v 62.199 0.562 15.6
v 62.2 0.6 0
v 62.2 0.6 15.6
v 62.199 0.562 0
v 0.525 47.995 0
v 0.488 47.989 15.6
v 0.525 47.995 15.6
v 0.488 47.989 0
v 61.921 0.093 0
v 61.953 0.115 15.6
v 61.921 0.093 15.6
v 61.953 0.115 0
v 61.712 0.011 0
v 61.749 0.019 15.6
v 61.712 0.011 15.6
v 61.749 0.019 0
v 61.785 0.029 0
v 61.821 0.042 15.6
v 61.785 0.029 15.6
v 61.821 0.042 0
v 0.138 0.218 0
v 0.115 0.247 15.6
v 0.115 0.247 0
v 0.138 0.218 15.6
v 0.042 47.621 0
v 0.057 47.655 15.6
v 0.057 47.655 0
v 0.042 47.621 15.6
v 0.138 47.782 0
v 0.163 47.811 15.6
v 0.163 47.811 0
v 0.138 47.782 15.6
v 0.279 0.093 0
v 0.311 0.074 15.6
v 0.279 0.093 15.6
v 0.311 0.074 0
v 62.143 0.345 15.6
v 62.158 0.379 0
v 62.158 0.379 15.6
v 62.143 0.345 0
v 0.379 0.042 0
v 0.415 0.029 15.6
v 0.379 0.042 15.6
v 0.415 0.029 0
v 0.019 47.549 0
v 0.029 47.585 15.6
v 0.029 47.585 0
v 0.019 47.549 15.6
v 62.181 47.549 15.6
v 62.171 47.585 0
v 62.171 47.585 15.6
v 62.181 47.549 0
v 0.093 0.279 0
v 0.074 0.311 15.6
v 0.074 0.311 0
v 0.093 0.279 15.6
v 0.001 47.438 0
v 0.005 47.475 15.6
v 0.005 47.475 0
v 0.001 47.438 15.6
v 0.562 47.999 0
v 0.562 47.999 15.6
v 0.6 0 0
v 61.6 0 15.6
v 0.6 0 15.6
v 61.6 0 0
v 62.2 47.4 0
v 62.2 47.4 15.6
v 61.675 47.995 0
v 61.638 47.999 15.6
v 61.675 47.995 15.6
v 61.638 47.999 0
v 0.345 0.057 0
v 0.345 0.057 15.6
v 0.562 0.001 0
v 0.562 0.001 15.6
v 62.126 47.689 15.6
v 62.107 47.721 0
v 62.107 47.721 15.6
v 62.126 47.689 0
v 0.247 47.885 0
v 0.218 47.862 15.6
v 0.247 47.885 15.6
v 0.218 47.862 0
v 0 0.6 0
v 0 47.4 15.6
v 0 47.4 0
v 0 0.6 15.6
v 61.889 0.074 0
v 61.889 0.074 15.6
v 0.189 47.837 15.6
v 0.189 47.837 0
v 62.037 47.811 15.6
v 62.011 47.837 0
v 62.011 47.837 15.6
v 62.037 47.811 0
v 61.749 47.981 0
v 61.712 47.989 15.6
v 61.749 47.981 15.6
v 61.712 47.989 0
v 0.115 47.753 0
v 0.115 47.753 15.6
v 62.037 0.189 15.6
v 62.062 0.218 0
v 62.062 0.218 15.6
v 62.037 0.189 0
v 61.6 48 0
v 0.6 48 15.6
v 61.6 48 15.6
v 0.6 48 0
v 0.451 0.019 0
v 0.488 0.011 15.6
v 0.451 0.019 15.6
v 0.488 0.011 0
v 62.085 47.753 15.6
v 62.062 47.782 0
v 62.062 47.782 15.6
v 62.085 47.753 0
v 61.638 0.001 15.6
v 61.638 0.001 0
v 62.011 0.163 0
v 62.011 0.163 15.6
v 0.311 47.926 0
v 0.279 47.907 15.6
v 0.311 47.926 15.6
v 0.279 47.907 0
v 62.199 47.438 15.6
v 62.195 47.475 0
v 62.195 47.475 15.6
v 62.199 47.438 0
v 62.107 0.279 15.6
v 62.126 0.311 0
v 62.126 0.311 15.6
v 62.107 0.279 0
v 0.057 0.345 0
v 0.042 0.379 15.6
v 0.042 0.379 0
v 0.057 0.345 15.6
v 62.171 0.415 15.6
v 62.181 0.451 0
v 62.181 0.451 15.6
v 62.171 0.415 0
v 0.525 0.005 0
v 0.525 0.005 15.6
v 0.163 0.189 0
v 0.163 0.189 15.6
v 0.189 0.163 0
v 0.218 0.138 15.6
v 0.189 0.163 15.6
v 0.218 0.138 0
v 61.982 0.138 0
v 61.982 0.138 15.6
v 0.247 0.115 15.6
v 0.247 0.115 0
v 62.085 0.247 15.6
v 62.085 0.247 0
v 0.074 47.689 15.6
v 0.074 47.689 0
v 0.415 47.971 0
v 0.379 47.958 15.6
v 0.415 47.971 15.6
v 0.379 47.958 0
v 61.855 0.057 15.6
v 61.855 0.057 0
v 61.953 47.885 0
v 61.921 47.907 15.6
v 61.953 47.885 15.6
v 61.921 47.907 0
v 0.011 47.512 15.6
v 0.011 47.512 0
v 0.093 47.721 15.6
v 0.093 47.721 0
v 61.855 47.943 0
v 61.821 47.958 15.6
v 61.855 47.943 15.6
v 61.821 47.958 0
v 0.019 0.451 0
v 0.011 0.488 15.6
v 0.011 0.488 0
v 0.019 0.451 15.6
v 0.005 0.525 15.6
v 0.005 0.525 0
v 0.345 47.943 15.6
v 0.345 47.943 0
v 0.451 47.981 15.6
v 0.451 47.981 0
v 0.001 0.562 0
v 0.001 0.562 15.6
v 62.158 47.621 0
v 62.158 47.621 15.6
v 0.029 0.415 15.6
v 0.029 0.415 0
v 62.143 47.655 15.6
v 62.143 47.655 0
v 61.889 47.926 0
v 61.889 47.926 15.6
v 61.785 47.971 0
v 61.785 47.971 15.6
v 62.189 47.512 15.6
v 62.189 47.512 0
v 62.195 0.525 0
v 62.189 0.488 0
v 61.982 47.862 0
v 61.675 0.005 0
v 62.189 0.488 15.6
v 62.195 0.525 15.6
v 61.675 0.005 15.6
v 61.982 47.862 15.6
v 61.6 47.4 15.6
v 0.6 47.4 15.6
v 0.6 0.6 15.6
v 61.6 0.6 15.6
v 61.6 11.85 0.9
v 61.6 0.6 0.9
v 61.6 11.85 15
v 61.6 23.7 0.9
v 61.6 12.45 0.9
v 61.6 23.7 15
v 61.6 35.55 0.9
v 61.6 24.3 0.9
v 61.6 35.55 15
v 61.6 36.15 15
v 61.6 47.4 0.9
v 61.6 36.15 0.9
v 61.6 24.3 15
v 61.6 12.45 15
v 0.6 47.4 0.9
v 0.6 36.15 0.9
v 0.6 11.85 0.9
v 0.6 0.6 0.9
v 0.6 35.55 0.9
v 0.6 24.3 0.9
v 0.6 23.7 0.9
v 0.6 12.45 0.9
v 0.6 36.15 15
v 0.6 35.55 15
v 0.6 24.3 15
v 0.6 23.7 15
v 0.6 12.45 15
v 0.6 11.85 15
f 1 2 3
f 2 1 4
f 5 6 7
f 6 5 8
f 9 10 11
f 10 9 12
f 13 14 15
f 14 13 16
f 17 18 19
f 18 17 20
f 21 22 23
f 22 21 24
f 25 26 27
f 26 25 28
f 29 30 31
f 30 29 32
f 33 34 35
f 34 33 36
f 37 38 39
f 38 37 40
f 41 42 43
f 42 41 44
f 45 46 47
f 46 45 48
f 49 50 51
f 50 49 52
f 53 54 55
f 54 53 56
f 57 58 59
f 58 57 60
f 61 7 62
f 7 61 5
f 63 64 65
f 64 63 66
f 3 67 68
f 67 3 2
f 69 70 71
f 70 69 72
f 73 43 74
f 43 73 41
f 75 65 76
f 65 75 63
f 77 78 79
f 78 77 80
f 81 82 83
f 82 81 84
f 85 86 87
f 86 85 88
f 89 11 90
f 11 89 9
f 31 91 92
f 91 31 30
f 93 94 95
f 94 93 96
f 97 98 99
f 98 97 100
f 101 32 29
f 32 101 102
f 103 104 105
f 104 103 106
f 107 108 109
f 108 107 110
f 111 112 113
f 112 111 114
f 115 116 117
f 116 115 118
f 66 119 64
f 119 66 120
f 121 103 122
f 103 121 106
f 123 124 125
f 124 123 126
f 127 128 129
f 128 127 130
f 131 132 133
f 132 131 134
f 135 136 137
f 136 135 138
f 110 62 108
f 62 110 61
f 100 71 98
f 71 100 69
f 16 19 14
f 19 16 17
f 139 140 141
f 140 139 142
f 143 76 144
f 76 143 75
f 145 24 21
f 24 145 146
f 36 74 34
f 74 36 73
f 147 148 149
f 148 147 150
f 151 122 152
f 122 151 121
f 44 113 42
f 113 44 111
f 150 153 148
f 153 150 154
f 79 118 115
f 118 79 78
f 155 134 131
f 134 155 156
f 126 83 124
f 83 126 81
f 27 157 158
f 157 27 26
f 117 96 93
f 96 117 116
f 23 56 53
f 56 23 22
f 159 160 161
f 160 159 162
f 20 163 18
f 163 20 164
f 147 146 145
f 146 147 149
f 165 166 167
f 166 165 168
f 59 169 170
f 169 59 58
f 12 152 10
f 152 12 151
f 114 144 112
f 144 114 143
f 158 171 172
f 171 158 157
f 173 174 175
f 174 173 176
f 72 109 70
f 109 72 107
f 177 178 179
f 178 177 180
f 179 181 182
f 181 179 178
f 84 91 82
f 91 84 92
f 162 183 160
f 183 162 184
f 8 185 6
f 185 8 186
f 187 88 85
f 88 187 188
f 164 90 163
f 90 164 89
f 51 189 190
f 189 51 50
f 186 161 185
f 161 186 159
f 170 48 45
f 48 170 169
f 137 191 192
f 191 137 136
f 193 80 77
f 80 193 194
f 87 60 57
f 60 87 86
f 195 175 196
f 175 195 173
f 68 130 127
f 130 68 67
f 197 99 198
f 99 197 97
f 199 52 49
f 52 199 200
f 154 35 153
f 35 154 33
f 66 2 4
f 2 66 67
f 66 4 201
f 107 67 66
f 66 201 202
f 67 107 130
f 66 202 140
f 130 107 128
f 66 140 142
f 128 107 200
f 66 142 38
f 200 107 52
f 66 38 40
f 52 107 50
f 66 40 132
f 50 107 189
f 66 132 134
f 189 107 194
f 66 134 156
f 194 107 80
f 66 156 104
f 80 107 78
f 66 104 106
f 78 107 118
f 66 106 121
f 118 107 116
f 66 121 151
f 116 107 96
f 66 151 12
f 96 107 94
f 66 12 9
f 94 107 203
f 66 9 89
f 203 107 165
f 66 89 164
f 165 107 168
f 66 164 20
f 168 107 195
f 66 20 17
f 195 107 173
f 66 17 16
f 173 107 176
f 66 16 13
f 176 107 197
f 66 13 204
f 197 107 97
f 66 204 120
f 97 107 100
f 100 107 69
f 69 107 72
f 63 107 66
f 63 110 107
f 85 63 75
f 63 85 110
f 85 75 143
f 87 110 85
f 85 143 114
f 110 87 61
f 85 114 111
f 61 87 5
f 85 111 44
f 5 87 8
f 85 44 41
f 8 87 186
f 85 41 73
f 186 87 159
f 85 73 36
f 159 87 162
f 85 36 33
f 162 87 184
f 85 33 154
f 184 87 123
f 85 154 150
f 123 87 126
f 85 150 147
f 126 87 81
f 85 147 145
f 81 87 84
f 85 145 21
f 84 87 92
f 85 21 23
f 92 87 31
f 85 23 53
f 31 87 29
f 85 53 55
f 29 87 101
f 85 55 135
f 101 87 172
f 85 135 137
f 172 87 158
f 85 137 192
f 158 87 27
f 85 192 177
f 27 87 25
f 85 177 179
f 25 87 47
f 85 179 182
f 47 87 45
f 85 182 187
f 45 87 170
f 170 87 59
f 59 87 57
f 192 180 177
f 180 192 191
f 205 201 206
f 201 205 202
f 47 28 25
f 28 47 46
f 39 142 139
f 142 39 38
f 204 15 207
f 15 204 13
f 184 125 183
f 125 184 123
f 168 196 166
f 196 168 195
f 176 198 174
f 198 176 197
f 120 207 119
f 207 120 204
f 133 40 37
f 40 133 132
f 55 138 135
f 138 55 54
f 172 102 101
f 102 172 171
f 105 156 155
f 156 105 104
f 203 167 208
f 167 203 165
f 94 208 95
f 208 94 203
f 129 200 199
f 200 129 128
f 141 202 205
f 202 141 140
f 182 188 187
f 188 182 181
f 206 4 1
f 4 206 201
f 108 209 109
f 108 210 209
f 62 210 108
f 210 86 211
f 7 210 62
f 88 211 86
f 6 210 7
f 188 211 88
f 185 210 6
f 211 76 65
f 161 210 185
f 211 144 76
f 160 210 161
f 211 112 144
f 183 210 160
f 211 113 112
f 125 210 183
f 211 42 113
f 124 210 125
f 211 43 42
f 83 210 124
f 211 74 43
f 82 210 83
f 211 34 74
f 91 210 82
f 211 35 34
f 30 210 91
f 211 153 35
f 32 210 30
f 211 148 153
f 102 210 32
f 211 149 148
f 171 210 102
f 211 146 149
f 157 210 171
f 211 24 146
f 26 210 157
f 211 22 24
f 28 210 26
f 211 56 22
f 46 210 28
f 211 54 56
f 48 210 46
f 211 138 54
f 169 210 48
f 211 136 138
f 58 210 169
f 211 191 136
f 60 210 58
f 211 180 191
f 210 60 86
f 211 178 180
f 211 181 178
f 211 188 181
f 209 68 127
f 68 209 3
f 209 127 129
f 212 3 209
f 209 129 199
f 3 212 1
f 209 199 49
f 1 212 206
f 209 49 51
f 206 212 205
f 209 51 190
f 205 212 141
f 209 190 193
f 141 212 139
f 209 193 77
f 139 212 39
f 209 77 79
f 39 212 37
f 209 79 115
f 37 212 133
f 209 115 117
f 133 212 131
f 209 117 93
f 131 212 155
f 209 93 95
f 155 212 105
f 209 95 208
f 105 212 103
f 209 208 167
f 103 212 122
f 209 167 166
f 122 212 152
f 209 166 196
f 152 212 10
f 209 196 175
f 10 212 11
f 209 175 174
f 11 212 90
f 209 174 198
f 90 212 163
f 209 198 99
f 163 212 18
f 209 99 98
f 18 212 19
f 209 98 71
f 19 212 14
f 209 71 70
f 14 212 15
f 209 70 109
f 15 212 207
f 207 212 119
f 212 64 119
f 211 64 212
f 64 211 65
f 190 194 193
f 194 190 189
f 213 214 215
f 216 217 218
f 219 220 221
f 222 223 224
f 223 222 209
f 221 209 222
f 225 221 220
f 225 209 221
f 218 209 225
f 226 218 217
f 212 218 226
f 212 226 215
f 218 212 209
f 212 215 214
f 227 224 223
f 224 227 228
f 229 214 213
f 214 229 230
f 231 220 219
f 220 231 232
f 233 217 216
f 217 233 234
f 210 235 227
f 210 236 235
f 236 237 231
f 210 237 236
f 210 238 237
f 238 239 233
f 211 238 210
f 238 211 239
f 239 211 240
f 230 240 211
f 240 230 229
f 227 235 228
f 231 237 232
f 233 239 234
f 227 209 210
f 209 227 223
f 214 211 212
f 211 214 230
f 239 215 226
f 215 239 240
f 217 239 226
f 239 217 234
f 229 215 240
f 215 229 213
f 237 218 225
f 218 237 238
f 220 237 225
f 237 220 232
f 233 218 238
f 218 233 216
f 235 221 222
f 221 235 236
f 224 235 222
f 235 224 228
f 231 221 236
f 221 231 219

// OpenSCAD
$fn=100; // resolution
frontPlateThickness=0.3;
bottomThickness=0.6;
cylRoundEdgeRadius=0.6;

face_plate_width = 61;
face_plate_height = 46.8;

compartmentWidth = 11.25;
wallThickness = 0.6;

boxDepth = 15;

//color( "yellow", 0.2 )
difference() {
    minkowski() {
        cube([face_plate_width, face_plate_height, boxDepth]);
        translate([cylRoundEdgeRadius,cylRoundEdgeRadius, 0])
        cylinder(r=cylRoundEdgeRadius,h=bottomThickness);
    }
    
    translate([cylRoundEdgeRadius,cylRoundEdgeRadius, 0.9])
    cube([face_plate_width, face_plate_height, boxDepth + 1]);
}

//color( "red", 1.0 )
translate([cylRoundEdgeRadius,compartmentWidth + wallThickness, 0])
cube([face_plate_width, wallThickness, boxDepth]);

translate([cylRoundEdgeRadius,(compartmentWidth + wallThickness) * 2, 0])
cube([face_plate_width, wallThickness, boxDepth]);

translate([cylRoundEdgeRadius,(compartmentWidth + wallThickness) * 3, 0])
cube([face_plate_width, wallThickness, boxDepth]);
